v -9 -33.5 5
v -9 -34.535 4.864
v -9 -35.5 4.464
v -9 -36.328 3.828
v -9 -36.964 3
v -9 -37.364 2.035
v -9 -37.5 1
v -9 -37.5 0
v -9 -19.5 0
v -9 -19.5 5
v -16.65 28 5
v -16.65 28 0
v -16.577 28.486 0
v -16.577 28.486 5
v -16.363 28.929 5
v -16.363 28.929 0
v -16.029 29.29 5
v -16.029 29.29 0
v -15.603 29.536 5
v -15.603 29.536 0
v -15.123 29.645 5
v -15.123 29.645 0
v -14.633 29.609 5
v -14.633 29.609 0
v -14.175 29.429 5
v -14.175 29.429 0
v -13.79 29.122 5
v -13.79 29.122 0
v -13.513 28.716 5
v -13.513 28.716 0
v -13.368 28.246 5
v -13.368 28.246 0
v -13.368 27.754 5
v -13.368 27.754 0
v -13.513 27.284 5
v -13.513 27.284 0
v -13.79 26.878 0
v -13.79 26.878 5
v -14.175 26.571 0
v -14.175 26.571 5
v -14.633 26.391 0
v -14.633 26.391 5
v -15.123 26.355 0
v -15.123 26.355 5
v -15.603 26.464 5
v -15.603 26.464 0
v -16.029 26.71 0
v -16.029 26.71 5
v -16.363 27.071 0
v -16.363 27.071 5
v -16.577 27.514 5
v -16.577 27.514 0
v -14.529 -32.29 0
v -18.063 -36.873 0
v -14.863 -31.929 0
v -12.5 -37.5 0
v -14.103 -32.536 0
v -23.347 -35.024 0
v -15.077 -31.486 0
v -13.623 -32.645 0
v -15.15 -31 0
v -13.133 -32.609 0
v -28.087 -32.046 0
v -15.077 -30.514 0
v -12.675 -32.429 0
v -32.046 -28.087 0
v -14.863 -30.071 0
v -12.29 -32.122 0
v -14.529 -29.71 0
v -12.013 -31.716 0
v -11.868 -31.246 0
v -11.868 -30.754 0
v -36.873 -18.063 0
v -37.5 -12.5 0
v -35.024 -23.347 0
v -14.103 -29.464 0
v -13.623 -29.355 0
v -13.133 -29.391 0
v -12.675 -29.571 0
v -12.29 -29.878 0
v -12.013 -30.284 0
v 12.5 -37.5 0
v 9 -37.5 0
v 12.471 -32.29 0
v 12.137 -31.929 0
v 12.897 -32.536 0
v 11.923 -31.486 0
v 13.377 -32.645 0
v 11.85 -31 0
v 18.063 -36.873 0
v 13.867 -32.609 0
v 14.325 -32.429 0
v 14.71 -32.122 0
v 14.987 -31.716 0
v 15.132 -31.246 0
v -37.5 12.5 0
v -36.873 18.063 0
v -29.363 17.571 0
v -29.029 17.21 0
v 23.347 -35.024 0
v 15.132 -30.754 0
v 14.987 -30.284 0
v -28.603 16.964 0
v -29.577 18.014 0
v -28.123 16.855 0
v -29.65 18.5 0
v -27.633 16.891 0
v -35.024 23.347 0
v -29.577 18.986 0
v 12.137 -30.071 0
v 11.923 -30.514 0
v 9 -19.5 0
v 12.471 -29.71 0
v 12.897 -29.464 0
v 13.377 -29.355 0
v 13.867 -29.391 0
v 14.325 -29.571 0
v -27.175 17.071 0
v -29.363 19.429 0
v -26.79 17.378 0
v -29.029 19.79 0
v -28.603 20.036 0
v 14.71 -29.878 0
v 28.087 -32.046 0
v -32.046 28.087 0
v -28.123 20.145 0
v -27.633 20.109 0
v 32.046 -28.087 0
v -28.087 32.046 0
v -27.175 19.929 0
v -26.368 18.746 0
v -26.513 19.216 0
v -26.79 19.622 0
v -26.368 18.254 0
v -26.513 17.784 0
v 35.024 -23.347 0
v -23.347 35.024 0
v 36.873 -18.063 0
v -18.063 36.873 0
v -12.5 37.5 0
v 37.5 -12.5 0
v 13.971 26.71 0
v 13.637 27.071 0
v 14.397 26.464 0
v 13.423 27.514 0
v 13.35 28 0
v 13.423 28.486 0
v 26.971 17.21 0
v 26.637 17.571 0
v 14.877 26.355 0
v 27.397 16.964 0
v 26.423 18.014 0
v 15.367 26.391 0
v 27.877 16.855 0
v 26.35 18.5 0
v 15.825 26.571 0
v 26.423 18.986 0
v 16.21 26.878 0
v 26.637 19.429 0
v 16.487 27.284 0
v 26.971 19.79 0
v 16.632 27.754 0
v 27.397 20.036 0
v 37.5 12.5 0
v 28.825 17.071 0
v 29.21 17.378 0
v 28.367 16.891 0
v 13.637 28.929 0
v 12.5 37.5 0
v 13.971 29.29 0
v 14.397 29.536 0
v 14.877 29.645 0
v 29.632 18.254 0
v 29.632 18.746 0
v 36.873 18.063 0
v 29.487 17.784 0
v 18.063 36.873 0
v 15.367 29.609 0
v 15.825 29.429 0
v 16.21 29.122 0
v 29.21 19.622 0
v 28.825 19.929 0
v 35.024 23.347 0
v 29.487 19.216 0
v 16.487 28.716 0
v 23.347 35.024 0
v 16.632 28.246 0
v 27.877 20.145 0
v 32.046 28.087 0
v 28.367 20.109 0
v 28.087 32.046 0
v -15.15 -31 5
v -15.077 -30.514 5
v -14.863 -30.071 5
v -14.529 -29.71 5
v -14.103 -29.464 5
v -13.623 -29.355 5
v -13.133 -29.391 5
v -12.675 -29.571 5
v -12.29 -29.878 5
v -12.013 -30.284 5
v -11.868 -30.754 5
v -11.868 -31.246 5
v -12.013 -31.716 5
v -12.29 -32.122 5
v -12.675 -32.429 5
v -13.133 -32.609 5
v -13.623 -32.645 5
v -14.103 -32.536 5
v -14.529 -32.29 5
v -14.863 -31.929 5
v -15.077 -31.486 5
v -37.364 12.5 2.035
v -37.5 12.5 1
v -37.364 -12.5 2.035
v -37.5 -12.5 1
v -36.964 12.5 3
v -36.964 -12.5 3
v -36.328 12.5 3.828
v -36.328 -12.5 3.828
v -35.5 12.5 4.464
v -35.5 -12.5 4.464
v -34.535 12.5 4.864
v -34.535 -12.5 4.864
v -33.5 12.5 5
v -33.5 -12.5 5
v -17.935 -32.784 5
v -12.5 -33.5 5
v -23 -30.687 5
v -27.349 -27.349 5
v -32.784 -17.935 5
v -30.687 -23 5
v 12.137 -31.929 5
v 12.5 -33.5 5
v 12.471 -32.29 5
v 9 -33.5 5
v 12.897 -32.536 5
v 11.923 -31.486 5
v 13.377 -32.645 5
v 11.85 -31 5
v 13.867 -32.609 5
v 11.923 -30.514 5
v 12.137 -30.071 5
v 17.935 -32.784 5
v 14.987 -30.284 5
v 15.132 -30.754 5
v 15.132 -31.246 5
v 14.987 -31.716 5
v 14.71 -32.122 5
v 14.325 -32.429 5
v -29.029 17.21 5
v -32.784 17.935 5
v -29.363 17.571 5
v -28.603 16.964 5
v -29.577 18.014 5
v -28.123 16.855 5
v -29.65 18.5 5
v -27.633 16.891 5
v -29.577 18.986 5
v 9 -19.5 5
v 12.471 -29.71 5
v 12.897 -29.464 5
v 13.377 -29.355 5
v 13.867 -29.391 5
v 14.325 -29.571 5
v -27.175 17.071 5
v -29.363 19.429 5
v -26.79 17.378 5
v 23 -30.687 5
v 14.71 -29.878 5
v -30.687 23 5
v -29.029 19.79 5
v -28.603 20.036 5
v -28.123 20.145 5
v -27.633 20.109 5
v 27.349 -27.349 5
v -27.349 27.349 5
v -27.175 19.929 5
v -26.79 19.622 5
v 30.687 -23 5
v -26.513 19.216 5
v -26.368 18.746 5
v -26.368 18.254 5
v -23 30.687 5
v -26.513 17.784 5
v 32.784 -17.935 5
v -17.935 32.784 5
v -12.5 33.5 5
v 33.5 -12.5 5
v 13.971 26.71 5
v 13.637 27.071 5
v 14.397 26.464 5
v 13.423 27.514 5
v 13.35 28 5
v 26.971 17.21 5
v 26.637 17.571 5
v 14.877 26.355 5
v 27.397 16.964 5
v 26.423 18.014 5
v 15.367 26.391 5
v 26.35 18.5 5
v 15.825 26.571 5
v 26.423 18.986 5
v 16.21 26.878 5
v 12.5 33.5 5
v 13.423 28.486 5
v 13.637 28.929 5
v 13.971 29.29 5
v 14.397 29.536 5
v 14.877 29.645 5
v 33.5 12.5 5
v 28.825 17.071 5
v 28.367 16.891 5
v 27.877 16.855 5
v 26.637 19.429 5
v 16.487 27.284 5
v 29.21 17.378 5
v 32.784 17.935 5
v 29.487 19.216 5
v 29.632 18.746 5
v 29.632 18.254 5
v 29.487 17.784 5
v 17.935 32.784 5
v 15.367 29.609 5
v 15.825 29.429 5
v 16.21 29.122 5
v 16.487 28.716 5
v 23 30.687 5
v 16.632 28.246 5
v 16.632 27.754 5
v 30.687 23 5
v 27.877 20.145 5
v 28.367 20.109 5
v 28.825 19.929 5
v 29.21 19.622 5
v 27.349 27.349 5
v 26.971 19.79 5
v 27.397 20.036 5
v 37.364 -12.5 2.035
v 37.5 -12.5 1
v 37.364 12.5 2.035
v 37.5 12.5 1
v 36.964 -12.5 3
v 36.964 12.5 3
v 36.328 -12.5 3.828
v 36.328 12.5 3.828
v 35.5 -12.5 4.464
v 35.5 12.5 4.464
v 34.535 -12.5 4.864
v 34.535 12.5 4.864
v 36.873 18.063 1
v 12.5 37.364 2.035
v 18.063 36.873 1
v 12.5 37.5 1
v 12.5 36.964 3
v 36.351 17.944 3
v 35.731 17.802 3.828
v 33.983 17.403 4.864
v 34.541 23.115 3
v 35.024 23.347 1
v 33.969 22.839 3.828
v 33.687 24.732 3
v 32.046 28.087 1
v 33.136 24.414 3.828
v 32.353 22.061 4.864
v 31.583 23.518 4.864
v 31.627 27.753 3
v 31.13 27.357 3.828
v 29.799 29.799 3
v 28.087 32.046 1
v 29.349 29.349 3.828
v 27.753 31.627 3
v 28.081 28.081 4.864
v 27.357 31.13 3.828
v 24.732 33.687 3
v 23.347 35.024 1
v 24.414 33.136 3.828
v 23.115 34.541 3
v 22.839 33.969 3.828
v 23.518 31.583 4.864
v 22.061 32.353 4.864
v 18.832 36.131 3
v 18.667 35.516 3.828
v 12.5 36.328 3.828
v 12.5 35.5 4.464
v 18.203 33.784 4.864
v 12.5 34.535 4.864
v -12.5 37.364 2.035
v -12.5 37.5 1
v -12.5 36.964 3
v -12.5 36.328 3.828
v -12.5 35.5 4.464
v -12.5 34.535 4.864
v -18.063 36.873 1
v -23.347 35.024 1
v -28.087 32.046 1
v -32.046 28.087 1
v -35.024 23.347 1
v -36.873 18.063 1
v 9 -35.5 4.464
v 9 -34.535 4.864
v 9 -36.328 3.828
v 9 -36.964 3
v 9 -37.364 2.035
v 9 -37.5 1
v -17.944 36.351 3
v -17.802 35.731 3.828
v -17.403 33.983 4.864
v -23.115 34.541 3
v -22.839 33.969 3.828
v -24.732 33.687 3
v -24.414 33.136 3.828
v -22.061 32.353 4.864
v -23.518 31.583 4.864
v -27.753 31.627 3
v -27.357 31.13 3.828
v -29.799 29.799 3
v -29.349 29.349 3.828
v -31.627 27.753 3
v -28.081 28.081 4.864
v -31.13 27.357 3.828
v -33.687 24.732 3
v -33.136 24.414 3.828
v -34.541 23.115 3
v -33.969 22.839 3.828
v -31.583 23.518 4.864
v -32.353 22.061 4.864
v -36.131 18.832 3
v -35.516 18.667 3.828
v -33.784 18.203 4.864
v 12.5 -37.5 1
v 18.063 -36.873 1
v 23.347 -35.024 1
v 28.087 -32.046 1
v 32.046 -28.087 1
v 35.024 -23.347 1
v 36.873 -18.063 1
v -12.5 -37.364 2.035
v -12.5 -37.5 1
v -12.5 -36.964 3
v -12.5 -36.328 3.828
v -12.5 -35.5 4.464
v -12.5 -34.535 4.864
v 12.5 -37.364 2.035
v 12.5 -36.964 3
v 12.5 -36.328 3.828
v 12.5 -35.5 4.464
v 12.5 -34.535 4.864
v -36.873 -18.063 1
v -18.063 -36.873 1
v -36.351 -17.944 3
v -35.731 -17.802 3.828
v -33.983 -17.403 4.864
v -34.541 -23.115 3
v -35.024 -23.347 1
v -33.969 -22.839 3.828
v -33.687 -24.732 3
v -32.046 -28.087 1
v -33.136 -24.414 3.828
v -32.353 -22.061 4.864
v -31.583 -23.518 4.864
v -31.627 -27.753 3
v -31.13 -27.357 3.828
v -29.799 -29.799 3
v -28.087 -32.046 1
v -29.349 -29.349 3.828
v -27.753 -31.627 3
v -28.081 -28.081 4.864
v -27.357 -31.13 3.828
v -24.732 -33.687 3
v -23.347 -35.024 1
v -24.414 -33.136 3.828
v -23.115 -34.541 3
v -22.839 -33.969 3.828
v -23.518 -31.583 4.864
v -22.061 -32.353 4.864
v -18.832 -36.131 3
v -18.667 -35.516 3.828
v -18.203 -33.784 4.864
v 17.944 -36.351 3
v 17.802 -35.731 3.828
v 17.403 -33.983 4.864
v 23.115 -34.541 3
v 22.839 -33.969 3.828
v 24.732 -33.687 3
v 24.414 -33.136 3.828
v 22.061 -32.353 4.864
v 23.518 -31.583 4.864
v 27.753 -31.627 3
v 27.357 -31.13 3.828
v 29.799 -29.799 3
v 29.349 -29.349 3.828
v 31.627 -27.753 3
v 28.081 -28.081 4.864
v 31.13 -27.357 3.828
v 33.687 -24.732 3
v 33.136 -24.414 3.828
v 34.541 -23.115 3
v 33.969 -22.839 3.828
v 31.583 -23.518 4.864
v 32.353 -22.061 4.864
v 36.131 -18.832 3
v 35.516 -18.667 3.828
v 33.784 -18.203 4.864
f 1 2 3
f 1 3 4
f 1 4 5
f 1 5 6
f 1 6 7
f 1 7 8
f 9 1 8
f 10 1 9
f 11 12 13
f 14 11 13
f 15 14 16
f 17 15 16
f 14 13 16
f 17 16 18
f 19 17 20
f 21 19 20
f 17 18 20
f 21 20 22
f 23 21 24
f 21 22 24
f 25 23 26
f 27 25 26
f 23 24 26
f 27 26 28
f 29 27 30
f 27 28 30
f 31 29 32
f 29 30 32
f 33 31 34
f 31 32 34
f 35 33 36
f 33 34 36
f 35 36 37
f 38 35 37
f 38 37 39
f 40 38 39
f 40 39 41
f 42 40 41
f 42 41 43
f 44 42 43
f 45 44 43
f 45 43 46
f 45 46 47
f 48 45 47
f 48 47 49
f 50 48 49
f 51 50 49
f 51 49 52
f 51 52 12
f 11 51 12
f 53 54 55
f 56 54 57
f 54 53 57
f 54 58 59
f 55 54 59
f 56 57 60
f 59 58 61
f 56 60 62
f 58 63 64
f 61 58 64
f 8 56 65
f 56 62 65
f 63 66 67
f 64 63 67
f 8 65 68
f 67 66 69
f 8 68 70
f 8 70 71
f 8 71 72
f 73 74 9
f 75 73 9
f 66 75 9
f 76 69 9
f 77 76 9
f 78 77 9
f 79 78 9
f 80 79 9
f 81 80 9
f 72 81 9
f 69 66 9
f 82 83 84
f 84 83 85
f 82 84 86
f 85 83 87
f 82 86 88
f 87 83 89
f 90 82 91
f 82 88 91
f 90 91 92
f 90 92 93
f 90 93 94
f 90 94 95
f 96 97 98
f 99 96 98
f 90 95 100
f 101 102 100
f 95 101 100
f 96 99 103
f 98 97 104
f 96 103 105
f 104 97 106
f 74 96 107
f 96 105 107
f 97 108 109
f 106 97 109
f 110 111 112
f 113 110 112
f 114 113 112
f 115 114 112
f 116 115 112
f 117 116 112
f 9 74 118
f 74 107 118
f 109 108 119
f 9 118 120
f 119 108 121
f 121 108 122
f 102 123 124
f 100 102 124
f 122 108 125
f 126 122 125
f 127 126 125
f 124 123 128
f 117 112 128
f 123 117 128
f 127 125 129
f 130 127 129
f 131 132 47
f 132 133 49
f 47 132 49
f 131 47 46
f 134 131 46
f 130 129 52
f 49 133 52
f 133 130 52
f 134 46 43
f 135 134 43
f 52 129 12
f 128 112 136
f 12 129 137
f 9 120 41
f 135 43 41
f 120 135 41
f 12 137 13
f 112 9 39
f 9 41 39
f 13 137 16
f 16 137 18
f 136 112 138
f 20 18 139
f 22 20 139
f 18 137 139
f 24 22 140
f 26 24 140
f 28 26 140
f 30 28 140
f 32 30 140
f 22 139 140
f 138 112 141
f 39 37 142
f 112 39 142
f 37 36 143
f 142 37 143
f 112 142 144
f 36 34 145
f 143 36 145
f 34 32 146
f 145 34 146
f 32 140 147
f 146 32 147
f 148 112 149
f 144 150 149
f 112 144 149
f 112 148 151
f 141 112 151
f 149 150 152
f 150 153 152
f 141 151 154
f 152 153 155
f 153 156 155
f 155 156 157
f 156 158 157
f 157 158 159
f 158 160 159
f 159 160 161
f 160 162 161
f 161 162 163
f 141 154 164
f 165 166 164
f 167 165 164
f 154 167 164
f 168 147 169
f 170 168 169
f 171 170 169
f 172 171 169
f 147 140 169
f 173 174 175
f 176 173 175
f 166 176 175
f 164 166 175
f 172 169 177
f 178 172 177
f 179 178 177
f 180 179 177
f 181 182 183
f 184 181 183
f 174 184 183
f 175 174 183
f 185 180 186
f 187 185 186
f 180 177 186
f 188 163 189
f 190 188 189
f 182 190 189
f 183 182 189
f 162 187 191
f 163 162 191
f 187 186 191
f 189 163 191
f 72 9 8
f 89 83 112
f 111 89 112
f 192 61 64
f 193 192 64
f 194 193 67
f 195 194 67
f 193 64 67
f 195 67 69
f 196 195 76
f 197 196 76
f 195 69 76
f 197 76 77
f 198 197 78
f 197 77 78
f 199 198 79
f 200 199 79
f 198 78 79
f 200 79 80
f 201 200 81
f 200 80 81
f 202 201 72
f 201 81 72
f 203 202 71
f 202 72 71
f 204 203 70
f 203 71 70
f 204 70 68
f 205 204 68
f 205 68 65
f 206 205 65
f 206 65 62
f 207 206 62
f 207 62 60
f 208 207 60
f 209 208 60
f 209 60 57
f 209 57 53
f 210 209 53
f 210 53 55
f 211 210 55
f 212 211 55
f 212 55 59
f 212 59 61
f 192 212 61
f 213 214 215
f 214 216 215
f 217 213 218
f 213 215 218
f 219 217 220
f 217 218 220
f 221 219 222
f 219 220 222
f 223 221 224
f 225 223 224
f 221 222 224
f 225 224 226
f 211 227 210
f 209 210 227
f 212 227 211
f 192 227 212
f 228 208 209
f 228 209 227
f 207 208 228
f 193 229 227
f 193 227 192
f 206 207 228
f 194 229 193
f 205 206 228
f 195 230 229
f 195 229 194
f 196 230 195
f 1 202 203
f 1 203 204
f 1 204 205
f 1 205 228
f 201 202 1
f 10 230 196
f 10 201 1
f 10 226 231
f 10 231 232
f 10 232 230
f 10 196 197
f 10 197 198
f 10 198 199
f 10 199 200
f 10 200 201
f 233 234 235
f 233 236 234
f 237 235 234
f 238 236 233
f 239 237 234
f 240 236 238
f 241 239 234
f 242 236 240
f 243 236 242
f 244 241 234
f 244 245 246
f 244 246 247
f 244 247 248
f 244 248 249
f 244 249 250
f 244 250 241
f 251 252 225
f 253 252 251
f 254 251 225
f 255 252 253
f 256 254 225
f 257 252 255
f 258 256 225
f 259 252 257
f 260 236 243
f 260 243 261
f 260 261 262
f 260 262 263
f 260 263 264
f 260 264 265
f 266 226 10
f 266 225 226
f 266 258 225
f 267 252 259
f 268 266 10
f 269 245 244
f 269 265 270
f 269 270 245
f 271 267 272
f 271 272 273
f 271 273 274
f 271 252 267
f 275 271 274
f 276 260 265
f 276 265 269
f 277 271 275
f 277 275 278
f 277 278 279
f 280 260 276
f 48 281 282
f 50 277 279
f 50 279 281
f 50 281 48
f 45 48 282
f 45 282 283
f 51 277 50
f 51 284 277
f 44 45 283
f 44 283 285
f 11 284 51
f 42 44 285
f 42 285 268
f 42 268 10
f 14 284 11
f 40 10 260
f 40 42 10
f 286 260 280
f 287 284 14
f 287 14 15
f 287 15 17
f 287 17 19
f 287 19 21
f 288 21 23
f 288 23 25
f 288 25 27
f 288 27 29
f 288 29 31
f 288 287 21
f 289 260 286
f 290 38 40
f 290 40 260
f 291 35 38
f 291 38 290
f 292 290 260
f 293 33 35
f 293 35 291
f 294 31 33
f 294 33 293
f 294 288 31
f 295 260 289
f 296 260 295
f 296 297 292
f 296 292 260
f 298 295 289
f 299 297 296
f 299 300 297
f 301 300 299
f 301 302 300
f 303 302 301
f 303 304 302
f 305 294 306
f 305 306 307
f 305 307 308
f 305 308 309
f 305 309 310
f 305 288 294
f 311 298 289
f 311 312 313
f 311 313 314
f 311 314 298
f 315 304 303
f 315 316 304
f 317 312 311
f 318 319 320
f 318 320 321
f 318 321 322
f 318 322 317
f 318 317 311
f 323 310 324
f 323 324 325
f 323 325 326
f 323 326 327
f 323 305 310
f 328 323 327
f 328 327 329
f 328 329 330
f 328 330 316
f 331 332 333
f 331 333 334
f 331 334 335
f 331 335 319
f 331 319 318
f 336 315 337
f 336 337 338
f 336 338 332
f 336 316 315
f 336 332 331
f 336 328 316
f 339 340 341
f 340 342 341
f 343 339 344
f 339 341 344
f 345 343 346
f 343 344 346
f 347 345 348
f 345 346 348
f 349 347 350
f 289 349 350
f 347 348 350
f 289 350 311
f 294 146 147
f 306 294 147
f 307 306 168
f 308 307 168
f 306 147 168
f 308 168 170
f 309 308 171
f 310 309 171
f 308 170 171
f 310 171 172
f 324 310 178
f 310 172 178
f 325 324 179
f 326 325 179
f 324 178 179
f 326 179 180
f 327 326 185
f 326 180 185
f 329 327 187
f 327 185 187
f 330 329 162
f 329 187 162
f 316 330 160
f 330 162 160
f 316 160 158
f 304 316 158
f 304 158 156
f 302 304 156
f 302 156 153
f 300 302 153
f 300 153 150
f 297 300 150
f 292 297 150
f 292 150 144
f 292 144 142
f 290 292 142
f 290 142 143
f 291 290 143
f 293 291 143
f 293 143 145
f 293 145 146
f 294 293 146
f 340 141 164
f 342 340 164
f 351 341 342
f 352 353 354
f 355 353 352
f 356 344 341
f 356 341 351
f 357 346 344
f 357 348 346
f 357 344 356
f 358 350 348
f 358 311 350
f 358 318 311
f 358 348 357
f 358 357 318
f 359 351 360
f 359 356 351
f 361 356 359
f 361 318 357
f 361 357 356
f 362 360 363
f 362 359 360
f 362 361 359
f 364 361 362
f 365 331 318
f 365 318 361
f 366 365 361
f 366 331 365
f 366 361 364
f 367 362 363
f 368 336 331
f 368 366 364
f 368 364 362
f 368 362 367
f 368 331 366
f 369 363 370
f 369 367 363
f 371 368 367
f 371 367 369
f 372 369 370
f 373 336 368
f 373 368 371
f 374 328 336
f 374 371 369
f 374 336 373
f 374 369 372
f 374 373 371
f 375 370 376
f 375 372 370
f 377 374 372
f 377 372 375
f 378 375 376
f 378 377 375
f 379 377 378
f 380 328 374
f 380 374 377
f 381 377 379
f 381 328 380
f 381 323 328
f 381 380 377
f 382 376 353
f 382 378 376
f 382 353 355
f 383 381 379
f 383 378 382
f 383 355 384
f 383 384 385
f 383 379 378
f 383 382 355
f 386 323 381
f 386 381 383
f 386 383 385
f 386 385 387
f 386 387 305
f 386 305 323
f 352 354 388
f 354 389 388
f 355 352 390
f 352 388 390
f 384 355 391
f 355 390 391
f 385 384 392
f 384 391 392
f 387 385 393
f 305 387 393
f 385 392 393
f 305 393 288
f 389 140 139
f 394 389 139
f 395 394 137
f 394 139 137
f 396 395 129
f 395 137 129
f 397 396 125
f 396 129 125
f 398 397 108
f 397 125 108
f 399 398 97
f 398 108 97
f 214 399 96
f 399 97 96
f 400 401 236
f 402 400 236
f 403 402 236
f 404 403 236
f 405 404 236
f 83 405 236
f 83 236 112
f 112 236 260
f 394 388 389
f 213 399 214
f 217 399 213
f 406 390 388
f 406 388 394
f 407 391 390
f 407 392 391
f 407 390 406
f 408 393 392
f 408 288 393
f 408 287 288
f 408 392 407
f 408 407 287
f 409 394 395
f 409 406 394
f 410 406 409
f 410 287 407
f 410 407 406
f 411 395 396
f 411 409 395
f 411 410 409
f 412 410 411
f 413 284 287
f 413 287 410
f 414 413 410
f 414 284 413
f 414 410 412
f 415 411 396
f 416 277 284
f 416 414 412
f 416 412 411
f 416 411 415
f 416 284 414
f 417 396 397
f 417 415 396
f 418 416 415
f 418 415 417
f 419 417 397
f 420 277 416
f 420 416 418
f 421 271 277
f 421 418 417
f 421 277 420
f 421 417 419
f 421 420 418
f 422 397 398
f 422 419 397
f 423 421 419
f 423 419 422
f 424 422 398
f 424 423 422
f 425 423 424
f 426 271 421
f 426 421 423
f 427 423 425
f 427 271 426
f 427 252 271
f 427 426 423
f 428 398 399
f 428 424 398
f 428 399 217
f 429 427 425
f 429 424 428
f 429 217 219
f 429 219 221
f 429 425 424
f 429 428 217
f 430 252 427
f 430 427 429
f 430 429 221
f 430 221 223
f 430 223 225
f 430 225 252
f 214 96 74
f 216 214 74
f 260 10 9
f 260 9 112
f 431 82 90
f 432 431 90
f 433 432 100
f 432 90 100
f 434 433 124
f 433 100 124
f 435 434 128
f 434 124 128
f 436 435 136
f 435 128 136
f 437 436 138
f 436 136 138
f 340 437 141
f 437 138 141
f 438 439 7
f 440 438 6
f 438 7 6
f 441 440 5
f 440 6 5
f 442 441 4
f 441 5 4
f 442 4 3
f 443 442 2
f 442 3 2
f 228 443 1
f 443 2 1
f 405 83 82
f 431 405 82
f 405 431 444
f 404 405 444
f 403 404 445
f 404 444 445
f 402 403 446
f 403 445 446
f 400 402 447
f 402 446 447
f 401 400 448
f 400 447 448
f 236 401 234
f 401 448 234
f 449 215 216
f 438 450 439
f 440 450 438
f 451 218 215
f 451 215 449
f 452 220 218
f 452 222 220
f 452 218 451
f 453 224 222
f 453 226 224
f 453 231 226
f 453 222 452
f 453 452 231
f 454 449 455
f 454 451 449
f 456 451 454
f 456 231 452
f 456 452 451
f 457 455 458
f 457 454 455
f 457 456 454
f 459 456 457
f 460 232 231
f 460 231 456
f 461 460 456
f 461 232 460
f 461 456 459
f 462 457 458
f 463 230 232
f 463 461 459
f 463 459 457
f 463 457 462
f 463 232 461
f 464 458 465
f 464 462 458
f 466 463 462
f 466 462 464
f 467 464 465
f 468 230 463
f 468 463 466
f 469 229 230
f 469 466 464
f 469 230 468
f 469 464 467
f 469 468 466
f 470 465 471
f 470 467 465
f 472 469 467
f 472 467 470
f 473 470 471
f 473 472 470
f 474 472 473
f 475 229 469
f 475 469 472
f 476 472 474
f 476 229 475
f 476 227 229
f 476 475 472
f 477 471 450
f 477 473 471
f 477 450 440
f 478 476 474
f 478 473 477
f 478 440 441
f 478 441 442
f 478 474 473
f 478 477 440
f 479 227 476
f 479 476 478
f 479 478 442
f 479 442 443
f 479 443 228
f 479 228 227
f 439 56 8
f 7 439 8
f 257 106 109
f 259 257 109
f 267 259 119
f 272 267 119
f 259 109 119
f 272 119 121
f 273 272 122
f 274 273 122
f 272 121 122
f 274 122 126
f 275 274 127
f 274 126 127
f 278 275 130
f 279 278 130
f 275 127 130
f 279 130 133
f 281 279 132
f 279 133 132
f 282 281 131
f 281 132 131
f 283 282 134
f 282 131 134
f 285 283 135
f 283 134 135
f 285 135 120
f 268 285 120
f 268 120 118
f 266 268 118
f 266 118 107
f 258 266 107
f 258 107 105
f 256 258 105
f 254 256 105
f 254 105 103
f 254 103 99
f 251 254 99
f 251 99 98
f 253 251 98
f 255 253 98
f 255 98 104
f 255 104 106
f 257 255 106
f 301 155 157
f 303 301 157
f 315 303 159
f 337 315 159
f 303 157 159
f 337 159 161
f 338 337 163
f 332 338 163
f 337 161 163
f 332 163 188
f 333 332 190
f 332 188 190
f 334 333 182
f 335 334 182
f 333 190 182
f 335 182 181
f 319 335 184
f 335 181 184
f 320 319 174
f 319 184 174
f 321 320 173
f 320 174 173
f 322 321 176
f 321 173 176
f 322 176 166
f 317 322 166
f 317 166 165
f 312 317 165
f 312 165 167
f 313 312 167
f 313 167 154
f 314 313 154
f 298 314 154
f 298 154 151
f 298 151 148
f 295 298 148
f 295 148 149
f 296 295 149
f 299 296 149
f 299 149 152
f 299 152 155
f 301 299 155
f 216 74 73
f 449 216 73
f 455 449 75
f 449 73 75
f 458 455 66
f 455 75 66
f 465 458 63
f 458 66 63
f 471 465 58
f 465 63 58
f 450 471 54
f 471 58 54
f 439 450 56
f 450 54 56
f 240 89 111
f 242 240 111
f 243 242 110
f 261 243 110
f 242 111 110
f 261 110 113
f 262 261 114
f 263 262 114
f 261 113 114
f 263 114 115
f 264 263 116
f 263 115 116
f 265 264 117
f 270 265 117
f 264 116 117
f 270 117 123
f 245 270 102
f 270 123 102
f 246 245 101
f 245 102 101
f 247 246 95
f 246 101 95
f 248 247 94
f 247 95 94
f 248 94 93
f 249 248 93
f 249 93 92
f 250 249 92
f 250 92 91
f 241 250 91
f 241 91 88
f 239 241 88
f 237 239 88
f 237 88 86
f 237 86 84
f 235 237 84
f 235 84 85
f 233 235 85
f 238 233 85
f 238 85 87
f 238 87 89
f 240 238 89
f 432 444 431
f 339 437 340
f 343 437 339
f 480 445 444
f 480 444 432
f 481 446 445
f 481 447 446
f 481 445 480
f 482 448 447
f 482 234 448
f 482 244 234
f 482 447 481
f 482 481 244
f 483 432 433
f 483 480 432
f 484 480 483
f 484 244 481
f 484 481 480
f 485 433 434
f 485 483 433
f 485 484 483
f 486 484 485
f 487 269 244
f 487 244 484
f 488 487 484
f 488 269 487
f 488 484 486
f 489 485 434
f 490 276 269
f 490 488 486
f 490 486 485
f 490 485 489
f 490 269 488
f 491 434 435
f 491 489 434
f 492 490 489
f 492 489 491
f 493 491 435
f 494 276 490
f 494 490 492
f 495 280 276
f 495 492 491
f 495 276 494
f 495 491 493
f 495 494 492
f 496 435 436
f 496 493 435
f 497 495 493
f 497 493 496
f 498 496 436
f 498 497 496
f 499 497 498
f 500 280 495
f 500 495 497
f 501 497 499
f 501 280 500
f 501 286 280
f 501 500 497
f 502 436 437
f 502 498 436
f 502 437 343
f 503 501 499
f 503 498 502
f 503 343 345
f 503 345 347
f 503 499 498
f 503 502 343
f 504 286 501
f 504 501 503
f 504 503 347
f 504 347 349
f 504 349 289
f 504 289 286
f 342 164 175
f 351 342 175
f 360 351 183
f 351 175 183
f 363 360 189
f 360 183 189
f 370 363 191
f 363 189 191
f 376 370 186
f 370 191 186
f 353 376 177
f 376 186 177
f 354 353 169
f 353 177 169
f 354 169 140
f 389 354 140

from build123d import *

# Parameters (mm, degrees)
F1_DEPTH = 5
F2_R     = 4
F4_D     = 3.3
F5_W     = 18
F5_H     = 18
F6_DEPTH = 5.001
F8_D     = 3.3


with BuildPart() as f1:
    # F0 (on Top) → F1 (new body)
    with BuildSketch(Plane.XY):
        with BuildLine():
            Line((12.5, 37.5), (-12.5, 37.5))
            ThreePointArc((-12.5, 37.5), (-30.1776695297, 30.1776695297), (-37.5, 12.5))
            Line((-37.5, 12.5), (-37.5, -12.5))
            ThreePointArc((-37.5, -12.5), (-30.1776695297, -30.1776695297), (-12.5, -37.5))
            Line((-12.5, -37.5), (12.5, -37.5))
            ThreePointArc((12.5, -37.5), (30.1776695297, -30.1776695297), (37.5, -12.5))
            Line((37.5, -12.5), (37.5, 12.5))
            ThreePointArc((37.5, 12.5), (30.1776695297, 30.1776695297), (12.5, 37.5))
        make_face()
    extrude(amount=F1_DEPTH)

    # F2
    f2_edges = [f1.edges().sort_by_distance(p)[0] for p in [
        (37.5, 0, 5),
        (30.17767, 30.17767, 5),
        (0, 37.5, 5),
        (-30.17767, 30.17767, 5),
        (-37.5, 0, 5),
        (-30.17767, -30.17767, 5),
        (0, -37.5, 5),
        (30.17767, -30.17767, 5),
    ]]
    fillet(f2_edges, radius=F2_R)

    # F4 (through all)
    with Locations(Plane.XY.offset(5)):
        with Locations((-28, 18.5), (28, 18.5), (-13.5, -31), (13.5, -31)):
            Hole(F4_D / 2)

    # F5 (on face) → F6 (cut, through all)
    with BuildSketch(Plane.XY.offset(5)):
        with Locations((0, -28.5)):
            Rectangle(F5_W, F5_H)
    extrude(amount=-F6_DEPTH, mode=Mode.SUBTRACT)

    # F8 (through all)
    with Locations(Plane.XY.offset(5)):
        with Locations((-15, 28), (15, 28)):
            Hole(F8_D / 2)


solid = f1.part
